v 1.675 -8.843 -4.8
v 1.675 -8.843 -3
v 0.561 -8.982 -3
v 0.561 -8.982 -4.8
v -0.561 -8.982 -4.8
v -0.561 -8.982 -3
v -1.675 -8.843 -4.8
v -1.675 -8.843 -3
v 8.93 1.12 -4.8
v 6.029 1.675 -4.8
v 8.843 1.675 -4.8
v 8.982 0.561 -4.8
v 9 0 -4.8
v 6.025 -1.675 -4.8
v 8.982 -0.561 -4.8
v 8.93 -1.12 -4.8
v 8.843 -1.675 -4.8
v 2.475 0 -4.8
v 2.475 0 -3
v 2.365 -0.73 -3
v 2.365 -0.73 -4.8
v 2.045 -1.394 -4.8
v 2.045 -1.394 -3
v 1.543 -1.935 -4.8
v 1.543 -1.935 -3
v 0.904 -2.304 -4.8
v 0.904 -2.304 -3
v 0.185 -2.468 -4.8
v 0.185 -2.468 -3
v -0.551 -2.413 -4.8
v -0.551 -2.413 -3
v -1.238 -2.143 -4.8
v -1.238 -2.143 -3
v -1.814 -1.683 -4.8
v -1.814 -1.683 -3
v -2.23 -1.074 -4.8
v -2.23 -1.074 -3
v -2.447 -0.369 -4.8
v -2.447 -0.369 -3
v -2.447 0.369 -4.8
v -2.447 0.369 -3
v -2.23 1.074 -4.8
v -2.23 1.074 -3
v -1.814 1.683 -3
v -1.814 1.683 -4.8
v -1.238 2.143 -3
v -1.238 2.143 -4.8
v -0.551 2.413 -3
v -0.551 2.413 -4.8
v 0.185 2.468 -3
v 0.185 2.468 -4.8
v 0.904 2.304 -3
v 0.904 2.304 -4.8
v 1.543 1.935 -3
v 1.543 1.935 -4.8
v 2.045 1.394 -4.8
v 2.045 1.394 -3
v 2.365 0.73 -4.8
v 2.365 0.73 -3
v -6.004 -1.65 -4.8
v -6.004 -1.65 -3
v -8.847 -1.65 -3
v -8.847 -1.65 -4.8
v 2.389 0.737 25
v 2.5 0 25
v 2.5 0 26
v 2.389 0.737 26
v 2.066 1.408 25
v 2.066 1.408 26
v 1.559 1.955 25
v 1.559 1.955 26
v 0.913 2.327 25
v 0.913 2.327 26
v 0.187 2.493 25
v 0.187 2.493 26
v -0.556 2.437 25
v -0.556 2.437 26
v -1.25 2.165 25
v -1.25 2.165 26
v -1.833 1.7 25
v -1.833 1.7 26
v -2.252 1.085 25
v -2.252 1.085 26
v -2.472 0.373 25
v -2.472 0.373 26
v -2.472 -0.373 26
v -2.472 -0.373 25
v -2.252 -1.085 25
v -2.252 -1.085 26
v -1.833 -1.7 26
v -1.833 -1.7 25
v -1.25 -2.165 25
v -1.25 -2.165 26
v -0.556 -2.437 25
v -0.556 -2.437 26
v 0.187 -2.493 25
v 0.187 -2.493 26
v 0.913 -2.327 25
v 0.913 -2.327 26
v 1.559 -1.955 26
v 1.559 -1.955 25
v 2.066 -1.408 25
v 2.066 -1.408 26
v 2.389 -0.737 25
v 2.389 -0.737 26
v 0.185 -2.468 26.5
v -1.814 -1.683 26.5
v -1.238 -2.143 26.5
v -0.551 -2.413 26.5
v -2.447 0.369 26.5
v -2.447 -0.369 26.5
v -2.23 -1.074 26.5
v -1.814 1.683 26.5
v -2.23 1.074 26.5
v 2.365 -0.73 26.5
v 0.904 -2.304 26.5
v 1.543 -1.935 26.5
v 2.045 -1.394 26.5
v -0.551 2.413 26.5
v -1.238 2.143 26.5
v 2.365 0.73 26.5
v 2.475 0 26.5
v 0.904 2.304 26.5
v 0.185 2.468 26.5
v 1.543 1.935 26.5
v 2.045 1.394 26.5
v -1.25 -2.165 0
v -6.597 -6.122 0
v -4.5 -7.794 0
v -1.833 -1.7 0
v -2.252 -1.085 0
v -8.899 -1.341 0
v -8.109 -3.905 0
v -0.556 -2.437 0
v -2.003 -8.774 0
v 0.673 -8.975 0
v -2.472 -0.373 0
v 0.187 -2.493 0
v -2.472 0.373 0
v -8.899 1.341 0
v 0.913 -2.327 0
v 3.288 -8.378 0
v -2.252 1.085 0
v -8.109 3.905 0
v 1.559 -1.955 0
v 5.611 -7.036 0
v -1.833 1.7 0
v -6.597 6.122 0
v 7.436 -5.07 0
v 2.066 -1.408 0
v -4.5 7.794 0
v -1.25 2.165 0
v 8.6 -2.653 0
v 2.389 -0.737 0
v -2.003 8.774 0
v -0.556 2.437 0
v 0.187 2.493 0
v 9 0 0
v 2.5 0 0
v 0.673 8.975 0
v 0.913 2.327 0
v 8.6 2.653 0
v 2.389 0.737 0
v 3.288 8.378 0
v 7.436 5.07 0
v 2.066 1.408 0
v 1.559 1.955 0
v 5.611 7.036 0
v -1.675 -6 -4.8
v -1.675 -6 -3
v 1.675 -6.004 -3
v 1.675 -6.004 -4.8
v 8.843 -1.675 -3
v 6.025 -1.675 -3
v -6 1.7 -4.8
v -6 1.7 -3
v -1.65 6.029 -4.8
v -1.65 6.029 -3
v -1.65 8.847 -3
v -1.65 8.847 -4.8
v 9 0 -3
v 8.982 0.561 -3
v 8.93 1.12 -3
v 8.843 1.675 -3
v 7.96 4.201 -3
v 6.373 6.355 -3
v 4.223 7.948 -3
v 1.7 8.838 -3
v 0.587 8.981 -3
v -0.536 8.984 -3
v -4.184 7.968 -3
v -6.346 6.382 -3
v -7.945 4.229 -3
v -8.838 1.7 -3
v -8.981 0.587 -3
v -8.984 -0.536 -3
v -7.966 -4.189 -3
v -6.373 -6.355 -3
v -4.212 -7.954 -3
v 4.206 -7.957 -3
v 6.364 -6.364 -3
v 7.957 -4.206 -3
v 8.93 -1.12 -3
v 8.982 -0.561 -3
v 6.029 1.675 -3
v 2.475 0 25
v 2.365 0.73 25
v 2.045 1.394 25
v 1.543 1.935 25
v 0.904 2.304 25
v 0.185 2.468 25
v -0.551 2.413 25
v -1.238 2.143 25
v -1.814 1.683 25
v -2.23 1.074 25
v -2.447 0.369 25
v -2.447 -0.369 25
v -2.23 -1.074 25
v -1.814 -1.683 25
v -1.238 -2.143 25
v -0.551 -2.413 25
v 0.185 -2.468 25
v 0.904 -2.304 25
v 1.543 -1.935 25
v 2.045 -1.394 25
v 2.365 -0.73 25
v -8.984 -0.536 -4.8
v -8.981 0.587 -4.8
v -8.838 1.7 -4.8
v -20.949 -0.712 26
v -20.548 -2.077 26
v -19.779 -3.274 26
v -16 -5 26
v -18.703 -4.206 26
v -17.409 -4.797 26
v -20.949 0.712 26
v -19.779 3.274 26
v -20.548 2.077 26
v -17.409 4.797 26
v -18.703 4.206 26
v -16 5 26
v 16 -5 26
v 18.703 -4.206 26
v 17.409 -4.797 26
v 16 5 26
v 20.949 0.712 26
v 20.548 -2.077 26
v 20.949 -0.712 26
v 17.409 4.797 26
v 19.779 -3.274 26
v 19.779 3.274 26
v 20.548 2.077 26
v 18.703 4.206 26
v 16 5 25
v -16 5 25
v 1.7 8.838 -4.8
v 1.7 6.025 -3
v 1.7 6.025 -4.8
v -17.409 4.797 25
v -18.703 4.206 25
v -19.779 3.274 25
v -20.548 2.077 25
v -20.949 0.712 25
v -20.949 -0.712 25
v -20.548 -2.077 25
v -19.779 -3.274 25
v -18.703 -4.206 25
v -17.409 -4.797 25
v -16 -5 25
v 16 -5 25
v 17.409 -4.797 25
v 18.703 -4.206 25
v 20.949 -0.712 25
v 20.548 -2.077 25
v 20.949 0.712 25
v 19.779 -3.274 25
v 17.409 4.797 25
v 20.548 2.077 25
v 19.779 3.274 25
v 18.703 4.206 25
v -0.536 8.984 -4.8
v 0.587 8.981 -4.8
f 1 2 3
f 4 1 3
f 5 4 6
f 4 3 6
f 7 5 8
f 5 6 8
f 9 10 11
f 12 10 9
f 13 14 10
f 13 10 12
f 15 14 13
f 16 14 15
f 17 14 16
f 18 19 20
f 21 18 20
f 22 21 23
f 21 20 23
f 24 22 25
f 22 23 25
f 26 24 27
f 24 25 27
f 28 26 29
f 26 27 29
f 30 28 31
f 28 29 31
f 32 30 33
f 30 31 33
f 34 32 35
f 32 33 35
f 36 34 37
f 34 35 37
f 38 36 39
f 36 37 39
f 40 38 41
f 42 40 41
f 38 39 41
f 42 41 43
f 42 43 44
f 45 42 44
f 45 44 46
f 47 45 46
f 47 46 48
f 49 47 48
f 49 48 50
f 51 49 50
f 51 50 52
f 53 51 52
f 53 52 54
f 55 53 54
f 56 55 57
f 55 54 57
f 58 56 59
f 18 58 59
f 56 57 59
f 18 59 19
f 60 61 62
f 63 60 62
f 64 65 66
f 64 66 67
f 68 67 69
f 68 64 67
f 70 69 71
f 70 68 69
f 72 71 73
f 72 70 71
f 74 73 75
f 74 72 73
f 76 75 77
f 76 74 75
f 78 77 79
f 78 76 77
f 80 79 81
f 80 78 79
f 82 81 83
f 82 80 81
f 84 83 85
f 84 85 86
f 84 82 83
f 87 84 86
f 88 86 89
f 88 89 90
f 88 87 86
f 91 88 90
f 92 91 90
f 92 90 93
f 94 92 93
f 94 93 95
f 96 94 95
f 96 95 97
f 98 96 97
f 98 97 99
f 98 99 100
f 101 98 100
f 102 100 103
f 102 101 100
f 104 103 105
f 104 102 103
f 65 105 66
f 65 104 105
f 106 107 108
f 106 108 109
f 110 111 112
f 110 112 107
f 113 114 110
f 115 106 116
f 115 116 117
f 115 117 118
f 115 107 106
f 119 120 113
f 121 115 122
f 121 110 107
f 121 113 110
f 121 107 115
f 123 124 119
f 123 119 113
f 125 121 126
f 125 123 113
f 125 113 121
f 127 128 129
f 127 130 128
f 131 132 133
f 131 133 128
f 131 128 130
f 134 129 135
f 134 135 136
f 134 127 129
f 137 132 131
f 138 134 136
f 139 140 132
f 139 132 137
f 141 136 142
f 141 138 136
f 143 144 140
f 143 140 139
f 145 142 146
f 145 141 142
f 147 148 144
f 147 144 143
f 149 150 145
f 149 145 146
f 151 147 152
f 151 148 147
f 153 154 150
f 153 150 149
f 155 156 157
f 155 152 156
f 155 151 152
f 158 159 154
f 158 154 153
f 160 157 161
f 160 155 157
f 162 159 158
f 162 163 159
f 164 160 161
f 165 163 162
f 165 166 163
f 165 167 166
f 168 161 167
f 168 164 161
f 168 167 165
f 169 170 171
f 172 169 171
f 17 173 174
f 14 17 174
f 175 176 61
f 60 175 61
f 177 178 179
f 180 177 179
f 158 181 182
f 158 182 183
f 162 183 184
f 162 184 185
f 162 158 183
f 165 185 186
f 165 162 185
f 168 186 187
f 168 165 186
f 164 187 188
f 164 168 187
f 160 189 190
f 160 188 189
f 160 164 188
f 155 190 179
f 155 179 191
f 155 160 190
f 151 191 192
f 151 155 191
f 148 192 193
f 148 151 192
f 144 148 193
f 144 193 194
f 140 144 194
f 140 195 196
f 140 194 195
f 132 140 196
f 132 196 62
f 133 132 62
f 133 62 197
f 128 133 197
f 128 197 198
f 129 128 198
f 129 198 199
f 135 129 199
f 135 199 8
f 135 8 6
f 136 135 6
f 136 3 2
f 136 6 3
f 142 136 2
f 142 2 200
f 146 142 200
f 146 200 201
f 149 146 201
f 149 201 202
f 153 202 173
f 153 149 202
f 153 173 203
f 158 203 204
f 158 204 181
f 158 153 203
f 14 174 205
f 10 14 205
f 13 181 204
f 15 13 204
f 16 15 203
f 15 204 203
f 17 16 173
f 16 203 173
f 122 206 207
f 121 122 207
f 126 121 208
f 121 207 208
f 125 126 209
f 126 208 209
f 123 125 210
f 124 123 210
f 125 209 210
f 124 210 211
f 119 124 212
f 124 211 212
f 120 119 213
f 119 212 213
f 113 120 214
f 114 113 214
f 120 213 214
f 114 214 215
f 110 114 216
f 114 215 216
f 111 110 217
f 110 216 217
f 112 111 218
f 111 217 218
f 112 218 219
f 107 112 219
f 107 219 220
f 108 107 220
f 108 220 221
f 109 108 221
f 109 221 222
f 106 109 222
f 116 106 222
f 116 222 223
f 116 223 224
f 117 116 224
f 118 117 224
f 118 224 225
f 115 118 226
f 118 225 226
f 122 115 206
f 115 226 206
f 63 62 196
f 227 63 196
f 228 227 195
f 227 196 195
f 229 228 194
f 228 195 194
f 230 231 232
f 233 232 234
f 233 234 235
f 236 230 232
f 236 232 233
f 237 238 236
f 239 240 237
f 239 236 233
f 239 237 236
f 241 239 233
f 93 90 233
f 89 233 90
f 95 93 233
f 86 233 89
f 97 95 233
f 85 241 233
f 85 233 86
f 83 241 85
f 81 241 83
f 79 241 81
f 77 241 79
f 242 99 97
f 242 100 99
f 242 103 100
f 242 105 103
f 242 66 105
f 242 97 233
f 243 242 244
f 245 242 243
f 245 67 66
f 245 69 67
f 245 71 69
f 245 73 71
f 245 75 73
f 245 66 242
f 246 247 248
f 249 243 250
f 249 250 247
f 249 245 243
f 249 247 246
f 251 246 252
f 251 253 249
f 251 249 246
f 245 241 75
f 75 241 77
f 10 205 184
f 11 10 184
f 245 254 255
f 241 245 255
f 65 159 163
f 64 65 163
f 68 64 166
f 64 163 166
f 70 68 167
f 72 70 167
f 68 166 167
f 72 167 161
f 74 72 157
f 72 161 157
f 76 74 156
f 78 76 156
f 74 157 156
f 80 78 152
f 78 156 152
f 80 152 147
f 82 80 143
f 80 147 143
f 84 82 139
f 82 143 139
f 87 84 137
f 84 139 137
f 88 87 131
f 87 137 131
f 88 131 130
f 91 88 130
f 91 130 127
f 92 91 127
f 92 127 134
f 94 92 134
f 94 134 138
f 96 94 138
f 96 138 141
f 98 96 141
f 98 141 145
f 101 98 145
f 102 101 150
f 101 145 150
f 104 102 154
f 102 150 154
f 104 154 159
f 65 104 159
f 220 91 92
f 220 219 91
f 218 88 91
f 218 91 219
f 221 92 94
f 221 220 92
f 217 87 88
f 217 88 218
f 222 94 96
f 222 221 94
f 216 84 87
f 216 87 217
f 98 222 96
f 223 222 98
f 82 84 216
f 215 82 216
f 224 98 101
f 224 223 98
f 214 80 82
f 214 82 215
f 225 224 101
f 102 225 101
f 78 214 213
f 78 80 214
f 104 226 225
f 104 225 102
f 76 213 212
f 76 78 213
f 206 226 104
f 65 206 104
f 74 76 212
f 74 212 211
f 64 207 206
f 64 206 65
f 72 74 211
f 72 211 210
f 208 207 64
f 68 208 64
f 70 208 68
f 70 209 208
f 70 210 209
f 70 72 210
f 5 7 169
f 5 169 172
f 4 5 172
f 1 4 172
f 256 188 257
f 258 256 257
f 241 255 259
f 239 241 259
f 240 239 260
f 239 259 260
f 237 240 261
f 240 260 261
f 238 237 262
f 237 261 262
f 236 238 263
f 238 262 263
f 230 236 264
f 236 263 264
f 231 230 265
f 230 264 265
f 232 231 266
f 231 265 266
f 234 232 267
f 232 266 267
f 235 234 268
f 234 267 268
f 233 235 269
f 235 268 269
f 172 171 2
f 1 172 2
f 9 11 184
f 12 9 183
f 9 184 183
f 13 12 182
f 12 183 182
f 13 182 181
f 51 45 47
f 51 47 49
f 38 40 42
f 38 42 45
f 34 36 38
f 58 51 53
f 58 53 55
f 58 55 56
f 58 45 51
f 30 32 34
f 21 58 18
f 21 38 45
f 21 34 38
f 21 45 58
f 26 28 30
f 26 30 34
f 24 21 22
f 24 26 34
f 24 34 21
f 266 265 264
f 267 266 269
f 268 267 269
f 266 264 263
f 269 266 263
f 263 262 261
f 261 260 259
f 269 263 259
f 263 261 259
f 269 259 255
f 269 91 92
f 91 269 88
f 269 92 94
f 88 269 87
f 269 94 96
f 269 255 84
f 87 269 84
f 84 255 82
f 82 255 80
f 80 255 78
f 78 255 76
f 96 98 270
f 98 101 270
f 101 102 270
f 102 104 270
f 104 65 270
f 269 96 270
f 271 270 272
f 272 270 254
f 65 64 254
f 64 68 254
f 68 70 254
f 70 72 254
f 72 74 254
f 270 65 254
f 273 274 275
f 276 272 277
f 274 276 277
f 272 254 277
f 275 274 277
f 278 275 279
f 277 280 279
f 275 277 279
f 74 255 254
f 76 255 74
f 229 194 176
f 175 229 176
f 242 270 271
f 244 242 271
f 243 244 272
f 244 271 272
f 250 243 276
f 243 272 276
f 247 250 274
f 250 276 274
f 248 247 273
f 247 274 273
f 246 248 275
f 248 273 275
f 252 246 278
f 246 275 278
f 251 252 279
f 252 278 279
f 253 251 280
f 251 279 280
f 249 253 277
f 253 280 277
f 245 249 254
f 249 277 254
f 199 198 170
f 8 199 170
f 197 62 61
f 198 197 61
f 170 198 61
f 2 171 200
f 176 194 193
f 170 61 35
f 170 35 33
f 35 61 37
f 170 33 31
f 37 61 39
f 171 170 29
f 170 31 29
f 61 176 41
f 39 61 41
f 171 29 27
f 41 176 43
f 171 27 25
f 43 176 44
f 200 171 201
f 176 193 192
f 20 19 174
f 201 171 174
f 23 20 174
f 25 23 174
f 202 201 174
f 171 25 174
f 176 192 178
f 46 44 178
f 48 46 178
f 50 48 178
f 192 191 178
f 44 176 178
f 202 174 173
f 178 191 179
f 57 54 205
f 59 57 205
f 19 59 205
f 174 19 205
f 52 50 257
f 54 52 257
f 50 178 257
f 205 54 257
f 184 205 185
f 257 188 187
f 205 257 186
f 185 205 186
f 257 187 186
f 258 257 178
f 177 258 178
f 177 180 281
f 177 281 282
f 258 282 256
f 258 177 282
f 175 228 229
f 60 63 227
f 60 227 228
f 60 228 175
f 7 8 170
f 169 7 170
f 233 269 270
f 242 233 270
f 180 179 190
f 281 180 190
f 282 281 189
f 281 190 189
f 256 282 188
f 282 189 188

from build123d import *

# Parameters (mm, degrees)
F0_R     = 2.5
F1_DEPTH = 25
F0_R_2   = 9
F0_R_3   = 5
F2_DEPTH = 3
F3_R     = 2.475
F4_DEPTH = 1.8
F5_R     = 2.475
F6_DEPTH = 1.5
F5_R_2   = 4
F5_R_3   = 2.5
F7_DEPTH = 1


# Not quite as in the source:
# - after a boolean that leaves OpenCascade's solid faulty, fix() repairs it


with BuildPart() as f1:
    # F0 (on Top) → F1 (new body)
    with BuildSketch(Plane.XY):
        Circle(F0_R)
    extrude(amount=F1_DEPTH)

    # F0 (on Top) → F2 (join)
    with BuildSketch(Plane.XY):
        Circle(F0_R_2)
        Circle(F0_R_3, mode=Mode.SUBTRACT)
        Circle(F0_R_3)
        Circle(F0_R, mode=Mode.SUBTRACT)
        Circle(F0_R)
    extrude(amount=-F2_DEPTH)

    # F3 (on face) → F4 (join)
    with BuildSketch(Plane(origin=(0, 0, -3), x_dir=(1, 0, 0), z_dir=(0, 0, -1))):
        Circle(F3_R)
        with BuildLine():
            Line((-6.0041221744, 1.6499974638), (-8.8474577348, 1.6499974638))
            ThreePointArc((-8.8474577348, 1.6499974638), (-8.9999640282, -0.0254458428), (-8.837986196, -1.7))
            Line((-8.837986196, -1.7), (-6, -1.7))
            Line((-6, -1.7), (-6.0041221744, 1.6499974638))
        make_face()
        with BuildLine():
            Line((-1.675, 8.8427583366), (-1.675, 6))
            Line((-1.675, 6), (1.6749974638, 6.0041221744))
            Line((1.6749974638, 6.0041221744), (1.6749974638, 8.842758817))
            ThreePointArc((1.6749974638, 8.842758817), (-1.2906e-06, 9), (-1.675, 8.8427583366))
        make_face()
        with BuildLine():
            ThreePointArc((9, 0), (8.9606033566, 0.841182195), (8.8427583366, 1.675))
            Line((8.8427583366, 1.675), (6.025, 1.675))
            Line((6.025, 1.675), (6.0291221744, -1.6749974638))
            Line((6.0291221744, -1.6749974638), (8.842758817, -1.6749974638))
            ThreePointArc((8.842758817, -1.6749974638), (8.9606034773, -0.84118091), (9, 0))
        make_face()
        with BuildLine():
            Line((-1.6499974638, -6.0291221744), (-1.6499974638, -8.8474577348))
            ThreePointArc((-1.6499974638, -8.8474577348), (0.0254458428, -8.9999640282), (1.7, -8.837986196))
            Line((1.7, -8.837986196), (1.7, -6.025))
            Line((1.7, -6.025), (-1.6499974638, -6.0291221744))
        make_face()
    extrude(amount=F4_DEPTH)

    add(f1.part.fix(), mode=Mode.REPLACE)

    # F5 (on face) → F6 (join)
    with BuildSketch(Plane.XY.offset(25)):
        Circle(F5_R)
    extrude(amount=F6_DEPTH)


with BuildPart() as f7:
    # F5 (on face) → F7 (new body)
    with BuildSketch(Plane.XY.offset(25)):
        with BuildLine():
            Line((16, 5), (-16, 5))
            ThreePointArc((-16, 5), (-21, 0), (-16, -5))
            Line((-16, -5), (16, -5))
            ThreePointArc((16, -5), (21, 0), (16, 5))
        make_face()
        Circle(F5_R_2, mode=Mode.SUBTRACT)
        Circle(F5_R_2)
        Circle(F5_R_3, mode=Mode.SUBTRACT)
    extrude(amount=F7_DEPTH)


solid = Compound([f1.part, f7.part])
